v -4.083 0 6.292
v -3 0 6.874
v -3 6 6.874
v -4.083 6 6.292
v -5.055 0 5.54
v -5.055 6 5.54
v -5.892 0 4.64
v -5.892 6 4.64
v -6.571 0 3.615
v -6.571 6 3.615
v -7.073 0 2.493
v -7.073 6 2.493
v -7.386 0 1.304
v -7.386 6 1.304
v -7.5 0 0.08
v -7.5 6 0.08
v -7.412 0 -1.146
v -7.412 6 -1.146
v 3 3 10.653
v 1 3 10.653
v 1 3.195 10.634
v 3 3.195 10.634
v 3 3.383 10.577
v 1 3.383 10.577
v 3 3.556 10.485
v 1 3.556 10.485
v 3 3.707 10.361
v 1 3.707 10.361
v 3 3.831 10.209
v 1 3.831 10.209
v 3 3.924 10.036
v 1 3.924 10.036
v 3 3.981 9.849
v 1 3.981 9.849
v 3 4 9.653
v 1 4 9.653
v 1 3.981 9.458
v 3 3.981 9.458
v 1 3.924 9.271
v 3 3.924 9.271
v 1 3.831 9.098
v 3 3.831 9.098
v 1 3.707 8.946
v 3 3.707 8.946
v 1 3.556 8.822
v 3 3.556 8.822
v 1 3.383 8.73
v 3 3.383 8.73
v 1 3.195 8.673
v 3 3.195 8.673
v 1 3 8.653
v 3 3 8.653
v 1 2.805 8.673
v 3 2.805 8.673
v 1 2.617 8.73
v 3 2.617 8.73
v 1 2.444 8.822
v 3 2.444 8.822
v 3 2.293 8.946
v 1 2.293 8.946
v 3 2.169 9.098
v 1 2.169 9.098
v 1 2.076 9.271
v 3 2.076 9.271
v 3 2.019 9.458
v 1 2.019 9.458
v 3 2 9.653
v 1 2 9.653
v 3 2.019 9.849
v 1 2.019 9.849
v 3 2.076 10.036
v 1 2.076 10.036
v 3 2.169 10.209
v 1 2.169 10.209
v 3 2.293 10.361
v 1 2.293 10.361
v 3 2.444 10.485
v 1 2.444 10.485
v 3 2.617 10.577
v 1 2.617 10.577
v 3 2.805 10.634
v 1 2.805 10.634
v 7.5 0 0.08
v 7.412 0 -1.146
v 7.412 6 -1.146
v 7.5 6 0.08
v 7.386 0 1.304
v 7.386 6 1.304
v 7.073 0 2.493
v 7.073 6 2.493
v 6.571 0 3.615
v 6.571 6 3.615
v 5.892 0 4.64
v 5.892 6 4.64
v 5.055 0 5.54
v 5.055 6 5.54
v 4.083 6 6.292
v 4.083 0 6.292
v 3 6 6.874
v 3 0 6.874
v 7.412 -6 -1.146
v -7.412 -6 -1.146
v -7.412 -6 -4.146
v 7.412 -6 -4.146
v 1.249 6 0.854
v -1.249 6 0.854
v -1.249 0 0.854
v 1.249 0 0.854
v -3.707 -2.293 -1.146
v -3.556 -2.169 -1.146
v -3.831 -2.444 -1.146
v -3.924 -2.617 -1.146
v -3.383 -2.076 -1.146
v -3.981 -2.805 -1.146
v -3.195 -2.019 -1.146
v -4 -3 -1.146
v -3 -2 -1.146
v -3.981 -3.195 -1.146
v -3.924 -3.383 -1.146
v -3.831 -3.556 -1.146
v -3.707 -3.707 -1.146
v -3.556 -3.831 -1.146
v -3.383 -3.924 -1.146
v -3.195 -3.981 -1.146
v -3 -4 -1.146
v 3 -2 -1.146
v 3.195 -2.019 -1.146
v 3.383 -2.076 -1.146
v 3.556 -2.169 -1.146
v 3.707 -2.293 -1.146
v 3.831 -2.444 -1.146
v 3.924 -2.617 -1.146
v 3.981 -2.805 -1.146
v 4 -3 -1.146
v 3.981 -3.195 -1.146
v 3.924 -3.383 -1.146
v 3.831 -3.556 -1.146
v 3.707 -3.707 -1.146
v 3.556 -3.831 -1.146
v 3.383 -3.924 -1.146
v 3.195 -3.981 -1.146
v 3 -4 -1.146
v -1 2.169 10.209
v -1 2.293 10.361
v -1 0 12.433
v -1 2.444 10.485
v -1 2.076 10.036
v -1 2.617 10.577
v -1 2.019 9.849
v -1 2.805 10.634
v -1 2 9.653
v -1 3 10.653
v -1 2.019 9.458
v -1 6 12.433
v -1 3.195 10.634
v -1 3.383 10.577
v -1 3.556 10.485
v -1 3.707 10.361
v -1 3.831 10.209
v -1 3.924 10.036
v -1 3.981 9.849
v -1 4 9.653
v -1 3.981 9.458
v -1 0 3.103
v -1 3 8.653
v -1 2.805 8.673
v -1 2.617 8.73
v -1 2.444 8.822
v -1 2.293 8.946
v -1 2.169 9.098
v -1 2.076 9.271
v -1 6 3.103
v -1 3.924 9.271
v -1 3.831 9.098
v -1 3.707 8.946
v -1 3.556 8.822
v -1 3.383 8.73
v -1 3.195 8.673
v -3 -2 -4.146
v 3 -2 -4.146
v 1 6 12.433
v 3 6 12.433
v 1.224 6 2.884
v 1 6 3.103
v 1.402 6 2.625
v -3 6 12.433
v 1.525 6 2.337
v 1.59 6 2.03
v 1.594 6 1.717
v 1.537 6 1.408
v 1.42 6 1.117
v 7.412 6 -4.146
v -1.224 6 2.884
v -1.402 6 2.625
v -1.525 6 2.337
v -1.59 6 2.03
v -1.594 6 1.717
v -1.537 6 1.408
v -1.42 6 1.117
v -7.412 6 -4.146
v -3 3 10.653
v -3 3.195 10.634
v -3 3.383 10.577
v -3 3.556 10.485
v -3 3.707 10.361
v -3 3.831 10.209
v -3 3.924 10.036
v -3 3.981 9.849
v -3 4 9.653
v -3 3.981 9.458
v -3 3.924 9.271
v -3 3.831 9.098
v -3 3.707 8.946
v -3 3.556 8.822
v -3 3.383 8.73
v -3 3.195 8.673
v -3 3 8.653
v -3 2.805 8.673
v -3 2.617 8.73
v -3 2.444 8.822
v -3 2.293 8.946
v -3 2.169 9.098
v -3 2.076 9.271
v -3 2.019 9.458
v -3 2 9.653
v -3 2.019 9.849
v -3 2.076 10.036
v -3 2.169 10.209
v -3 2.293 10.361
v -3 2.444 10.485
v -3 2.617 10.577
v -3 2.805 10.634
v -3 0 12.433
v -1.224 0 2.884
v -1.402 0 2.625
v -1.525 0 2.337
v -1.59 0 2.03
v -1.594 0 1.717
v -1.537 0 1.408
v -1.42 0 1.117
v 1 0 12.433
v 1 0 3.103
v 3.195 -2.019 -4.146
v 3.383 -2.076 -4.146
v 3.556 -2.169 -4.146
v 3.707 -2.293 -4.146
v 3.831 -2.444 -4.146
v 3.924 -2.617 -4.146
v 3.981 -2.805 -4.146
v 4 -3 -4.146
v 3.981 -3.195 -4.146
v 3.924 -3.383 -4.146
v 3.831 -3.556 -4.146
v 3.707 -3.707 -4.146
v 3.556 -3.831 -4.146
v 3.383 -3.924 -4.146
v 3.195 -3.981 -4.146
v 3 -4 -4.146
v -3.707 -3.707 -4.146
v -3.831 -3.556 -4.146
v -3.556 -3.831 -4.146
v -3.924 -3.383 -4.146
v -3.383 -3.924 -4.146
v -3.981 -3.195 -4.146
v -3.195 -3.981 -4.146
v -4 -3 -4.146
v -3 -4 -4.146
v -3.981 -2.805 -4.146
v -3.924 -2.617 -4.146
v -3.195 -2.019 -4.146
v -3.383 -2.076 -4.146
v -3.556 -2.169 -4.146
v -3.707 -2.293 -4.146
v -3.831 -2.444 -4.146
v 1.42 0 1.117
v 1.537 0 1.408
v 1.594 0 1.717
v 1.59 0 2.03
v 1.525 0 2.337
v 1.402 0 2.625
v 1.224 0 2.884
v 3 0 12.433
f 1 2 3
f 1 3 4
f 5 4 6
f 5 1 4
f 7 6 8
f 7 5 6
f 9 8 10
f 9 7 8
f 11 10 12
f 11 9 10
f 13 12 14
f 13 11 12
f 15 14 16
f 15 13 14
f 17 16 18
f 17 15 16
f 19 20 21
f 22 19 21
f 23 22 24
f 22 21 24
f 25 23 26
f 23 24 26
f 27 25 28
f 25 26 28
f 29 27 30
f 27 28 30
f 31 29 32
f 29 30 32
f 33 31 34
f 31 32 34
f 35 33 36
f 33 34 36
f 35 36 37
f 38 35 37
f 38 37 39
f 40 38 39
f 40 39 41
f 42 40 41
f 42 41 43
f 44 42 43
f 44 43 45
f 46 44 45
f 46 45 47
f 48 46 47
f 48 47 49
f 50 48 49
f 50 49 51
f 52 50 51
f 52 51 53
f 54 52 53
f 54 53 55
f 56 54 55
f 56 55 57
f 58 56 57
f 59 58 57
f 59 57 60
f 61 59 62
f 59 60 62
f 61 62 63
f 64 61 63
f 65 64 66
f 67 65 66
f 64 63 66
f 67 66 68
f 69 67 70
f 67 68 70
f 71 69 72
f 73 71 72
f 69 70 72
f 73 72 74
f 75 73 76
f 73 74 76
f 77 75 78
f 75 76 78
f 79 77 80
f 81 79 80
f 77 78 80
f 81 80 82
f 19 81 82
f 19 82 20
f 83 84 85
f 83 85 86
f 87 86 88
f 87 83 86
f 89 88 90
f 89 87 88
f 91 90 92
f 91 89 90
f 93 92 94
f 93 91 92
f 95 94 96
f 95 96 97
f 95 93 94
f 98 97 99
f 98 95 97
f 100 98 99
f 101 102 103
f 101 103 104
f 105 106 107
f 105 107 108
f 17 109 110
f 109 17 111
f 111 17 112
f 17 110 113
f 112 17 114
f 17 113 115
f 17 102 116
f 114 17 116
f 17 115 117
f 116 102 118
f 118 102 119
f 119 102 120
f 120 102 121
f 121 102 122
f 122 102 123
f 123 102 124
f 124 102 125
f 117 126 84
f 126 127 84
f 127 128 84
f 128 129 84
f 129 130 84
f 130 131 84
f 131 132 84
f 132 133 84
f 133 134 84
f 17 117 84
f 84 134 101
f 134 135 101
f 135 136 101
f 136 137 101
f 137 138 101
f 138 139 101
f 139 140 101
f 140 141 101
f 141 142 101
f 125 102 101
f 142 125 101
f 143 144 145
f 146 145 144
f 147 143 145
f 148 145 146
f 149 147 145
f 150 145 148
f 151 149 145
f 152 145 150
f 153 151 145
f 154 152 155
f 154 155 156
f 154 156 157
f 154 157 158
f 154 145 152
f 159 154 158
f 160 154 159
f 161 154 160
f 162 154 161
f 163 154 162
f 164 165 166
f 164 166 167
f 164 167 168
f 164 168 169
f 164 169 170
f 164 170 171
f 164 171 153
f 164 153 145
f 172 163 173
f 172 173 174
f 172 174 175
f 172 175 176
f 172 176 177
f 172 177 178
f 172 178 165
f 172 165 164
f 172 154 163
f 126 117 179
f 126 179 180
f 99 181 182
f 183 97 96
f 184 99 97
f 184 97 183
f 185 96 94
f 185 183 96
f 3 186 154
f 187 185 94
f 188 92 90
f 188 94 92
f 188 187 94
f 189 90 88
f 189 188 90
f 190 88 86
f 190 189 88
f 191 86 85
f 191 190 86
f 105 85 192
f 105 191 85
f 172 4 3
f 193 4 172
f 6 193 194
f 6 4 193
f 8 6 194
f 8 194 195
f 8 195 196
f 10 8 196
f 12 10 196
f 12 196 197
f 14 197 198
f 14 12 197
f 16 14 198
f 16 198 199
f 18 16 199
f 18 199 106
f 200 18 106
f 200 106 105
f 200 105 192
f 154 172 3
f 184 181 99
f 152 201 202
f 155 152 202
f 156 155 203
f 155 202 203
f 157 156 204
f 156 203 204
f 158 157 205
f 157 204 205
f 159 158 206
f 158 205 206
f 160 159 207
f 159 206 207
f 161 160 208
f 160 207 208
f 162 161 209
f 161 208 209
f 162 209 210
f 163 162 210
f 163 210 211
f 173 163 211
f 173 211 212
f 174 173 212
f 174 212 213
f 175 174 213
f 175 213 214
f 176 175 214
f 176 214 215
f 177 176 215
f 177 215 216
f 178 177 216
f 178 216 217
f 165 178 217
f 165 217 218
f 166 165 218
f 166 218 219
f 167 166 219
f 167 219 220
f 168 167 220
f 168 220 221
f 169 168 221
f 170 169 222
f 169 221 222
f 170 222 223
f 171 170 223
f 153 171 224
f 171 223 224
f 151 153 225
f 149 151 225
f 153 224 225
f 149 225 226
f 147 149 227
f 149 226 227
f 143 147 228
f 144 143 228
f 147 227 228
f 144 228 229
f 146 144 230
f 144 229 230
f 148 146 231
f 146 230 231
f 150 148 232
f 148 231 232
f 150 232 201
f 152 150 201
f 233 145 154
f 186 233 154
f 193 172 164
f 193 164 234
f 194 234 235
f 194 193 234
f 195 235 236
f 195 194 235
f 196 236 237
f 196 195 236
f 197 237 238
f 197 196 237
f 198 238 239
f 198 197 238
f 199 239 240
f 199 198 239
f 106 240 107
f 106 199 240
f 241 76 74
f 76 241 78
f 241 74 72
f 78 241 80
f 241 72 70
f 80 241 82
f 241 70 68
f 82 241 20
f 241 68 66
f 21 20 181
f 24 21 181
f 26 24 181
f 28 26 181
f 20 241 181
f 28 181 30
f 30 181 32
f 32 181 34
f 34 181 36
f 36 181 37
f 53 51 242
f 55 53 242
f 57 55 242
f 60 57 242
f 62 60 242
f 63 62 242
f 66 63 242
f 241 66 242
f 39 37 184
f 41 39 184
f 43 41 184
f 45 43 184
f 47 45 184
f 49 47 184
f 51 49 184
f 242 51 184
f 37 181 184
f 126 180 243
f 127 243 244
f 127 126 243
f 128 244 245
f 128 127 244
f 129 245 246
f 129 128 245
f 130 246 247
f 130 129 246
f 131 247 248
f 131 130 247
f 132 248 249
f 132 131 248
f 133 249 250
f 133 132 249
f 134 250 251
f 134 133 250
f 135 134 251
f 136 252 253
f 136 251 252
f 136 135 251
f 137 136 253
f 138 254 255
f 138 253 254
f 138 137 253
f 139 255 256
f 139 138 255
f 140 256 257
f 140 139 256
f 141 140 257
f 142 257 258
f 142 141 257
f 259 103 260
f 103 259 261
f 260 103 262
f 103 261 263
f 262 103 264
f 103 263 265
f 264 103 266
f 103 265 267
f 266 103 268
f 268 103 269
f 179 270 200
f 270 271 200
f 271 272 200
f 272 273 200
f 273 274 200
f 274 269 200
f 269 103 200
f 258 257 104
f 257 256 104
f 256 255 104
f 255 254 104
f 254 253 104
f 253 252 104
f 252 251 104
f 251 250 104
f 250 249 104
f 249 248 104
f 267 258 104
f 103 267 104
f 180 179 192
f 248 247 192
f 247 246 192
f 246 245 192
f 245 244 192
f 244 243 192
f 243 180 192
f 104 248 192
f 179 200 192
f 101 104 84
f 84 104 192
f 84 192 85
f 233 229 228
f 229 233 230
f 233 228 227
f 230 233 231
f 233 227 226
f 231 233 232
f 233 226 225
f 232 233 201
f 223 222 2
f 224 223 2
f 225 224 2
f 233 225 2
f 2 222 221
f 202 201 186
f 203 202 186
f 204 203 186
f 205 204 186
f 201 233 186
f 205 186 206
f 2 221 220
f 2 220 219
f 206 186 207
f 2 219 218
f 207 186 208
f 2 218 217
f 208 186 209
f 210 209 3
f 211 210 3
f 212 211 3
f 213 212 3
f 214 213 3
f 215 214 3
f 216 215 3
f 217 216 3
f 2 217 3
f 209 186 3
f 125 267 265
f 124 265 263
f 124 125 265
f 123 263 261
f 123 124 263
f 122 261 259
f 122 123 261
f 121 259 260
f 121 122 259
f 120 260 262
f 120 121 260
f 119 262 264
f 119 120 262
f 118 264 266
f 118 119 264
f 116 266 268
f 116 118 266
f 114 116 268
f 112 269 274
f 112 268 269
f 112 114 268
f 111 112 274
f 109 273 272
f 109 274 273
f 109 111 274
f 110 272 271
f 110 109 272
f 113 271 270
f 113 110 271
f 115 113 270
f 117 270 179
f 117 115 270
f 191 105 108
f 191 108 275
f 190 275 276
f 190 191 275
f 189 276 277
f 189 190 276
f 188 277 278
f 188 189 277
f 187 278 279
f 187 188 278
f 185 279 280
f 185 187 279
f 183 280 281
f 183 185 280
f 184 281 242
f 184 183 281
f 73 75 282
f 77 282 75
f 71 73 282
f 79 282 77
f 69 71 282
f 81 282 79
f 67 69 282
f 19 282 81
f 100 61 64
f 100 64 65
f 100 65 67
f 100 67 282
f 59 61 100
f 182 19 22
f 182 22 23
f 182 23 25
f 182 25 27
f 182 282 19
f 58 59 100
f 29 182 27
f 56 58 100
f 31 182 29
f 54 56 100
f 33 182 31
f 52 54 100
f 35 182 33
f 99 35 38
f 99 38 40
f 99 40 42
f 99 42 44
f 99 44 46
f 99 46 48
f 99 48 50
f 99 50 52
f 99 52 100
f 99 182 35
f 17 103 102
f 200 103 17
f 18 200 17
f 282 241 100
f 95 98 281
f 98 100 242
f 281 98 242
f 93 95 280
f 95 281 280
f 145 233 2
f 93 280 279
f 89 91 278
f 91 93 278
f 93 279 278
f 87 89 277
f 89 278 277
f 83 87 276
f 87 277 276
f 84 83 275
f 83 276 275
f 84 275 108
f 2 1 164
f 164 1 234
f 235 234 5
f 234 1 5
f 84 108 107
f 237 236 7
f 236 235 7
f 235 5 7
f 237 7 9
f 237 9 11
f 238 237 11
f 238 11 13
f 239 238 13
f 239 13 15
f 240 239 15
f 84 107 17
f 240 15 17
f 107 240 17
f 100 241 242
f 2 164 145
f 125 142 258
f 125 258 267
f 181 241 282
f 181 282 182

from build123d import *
from build123d.topology import SkipClean

# Parameters (mm, degrees)
BOSS_EXTRUDE1_DEPTH = 6
BOSS_EXTRUDE4_START = 6
BOSS_EXTRUDE4_DEPTH = 6
CUT_EXTRUDE1_DEPTH  = 8
BOSS_EXTRUDE5_START = -12
SKETCH9_W           = 14.823924706
SKETCH9_H           = 3
BOSS_EXTRUDE5_DEPTH = 12
CUT_EXTRUDE3_DEPTH  = 10
CUT_EXTRUDE4_DEPTH  = 17.015617378
SKETCH12_W          = 7
SKETCH12_H          = 6
BOSS_EXTRUDE6_DEPTH = 2
SKETCH13_R          = 1
CUT_EXTRUDE5_DEPTH  = 18.344461472


with BuildPart() as part:
    # Sketch3 → Boss-Extrude1 (new body)
    with BuildSketch(Plane(origin=(0, 0, 0), x_dir=(1, 0, 0), z_dir=(0, 1, 0))):
        with BuildLine():
            Line((-6.25, 4.145780988), (6.25, 4.145780988))
            ThreePointArc((6.25, 4.145780988), (0, -7.5), (-6.25, 4.145780988))
        make_face()
    extrude(amount=BOSS_EXTRUDE1_DEPTH)

    # Sketch7 → Boss-Extrude4 (add)
    with SkipClean():  # the faces are left unmerged after this step: merging them gives an invalid solid
        with BuildSketch(Plane.XZ.offset(BOSS_EXTRUDE4_START)):
            with BuildLine():
                Line((6.25, -4.145780988), (-6.25, -4.145780988))
                ThreePointArc((-6.25, -4.145780988), (-6.993733183, -2.708818223), (-7.411962353, -1.145780988))
                Line((-7.411962353, -1.145780988), (7.411962353, -1.145780988))
                ThreePointArc((7.411962353, -1.145780988), (6.993733183, -2.708818223), (6.25, -4.145780988))
            make_face()
        extrude(amount=-BOSS_EXTRUDE4_DEPTH)

    # Sketch4 → Cut-Extrude1 (cut)
    with SkipClean():  # the faces are left unmerged after this step: merging them gives an invalid solid
        with BuildSketch(Plane(origin=(0, 6, 0), x_dir=(1, 0, 0), z_dir=(0, 1, 0))):
            with BuildLine():
                Line((-1.2489996, -0.854219012), (1.2489996, -0.854219012))
                ThreePointArc((1.2489996, -0.854219012), (0, -3.454219012), (-1.2489996, -0.854219012))
            make_face()
        extrude(amount=-CUT_EXTRUDE1_DEPTH, mode=Mode.SUBTRACT)

    # Sketch9 → Boss-Extrude5 (add)
    with BuildSketch(Plane.XZ.offset(6).offset(BOSS_EXTRUDE5_START)):
        with Locations((0, -2.645780988)):
            Rectangle(SKETCH9_W, SKETCH9_H)
    extrude(amount=BOSS_EXTRUDE5_DEPTH)

    # Sketch8 → Cut-Extrude3 (cut)
    with BuildSketch(Plane.XY.offset(-1.145780988)):
        with BuildLine():
            Line((-3, -2), (3, -2))
            ThreePointArc((3, -2), (4, -3), (3, -4))
            Line((3, -4), (-3, -4))
            ThreePointArc((-3, -4), (-4, -3), (-3, -2))
        make_face()
    extrude(amount=-CUT_EXTRUDE3_DEPTH, mode=Mode.SUBTRACT)

    # Sketch11 → Cut-Extrude4 (cut, through all)
    with BuildSketch(Plane(origin=(0, 6, 0), x_dir=(1, 0, 0), z_dir=(0, 1, 0))):
        with BuildLine():
            Line((-1, -7.433034374), (-1, -3.103218612))
            ThreePointArc((-1, -3.103218612), (0, -3.454219012), (1, -3.103218612))
            Line((1, -3.103218612), (1, -7.433034374))
            ThreePointArc((1, -7.433034374), (0, -7.5), (-1, -7.433034374))
        make_face()
    extrude(amount=-CUT_EXTRUDE4_DEPTH, mode=Mode.SUBTRACT)

    # Sketch12 → Boss-Extrude6 (add)
    with BuildSketch(Plane(origin=(-1, 0, 0), x_dir=(0, 0, -1), z_dir=(1, 0, 0))):
        with Locations((-8.933034374, 3)):
            Rectangle(SKETCH12_W, SKETCH12_H)
    boss_extrude6 = extrude(amount=-BOSS_EXTRUDE6_DEPTH)

    # Mirror1: Boss-Extrude6 across plane
    add(boss_extrude6.mirror(Plane(origin=(0, 0, 0), x_dir=(0, 0, 1), z_dir=(1, 0, 0))))

    # Sketch13 → Cut-Extrude5 (cut, through all)
    with BuildSketch(Plane.ZY.offset(3)):
        with Locations((9.653448958, 3)):
            Circle(SKETCH13_R)
    extrude(amount=-CUT_EXTRUDE5_DEPTH, mode=Mode.SUBTRACT)


solid = part.part
